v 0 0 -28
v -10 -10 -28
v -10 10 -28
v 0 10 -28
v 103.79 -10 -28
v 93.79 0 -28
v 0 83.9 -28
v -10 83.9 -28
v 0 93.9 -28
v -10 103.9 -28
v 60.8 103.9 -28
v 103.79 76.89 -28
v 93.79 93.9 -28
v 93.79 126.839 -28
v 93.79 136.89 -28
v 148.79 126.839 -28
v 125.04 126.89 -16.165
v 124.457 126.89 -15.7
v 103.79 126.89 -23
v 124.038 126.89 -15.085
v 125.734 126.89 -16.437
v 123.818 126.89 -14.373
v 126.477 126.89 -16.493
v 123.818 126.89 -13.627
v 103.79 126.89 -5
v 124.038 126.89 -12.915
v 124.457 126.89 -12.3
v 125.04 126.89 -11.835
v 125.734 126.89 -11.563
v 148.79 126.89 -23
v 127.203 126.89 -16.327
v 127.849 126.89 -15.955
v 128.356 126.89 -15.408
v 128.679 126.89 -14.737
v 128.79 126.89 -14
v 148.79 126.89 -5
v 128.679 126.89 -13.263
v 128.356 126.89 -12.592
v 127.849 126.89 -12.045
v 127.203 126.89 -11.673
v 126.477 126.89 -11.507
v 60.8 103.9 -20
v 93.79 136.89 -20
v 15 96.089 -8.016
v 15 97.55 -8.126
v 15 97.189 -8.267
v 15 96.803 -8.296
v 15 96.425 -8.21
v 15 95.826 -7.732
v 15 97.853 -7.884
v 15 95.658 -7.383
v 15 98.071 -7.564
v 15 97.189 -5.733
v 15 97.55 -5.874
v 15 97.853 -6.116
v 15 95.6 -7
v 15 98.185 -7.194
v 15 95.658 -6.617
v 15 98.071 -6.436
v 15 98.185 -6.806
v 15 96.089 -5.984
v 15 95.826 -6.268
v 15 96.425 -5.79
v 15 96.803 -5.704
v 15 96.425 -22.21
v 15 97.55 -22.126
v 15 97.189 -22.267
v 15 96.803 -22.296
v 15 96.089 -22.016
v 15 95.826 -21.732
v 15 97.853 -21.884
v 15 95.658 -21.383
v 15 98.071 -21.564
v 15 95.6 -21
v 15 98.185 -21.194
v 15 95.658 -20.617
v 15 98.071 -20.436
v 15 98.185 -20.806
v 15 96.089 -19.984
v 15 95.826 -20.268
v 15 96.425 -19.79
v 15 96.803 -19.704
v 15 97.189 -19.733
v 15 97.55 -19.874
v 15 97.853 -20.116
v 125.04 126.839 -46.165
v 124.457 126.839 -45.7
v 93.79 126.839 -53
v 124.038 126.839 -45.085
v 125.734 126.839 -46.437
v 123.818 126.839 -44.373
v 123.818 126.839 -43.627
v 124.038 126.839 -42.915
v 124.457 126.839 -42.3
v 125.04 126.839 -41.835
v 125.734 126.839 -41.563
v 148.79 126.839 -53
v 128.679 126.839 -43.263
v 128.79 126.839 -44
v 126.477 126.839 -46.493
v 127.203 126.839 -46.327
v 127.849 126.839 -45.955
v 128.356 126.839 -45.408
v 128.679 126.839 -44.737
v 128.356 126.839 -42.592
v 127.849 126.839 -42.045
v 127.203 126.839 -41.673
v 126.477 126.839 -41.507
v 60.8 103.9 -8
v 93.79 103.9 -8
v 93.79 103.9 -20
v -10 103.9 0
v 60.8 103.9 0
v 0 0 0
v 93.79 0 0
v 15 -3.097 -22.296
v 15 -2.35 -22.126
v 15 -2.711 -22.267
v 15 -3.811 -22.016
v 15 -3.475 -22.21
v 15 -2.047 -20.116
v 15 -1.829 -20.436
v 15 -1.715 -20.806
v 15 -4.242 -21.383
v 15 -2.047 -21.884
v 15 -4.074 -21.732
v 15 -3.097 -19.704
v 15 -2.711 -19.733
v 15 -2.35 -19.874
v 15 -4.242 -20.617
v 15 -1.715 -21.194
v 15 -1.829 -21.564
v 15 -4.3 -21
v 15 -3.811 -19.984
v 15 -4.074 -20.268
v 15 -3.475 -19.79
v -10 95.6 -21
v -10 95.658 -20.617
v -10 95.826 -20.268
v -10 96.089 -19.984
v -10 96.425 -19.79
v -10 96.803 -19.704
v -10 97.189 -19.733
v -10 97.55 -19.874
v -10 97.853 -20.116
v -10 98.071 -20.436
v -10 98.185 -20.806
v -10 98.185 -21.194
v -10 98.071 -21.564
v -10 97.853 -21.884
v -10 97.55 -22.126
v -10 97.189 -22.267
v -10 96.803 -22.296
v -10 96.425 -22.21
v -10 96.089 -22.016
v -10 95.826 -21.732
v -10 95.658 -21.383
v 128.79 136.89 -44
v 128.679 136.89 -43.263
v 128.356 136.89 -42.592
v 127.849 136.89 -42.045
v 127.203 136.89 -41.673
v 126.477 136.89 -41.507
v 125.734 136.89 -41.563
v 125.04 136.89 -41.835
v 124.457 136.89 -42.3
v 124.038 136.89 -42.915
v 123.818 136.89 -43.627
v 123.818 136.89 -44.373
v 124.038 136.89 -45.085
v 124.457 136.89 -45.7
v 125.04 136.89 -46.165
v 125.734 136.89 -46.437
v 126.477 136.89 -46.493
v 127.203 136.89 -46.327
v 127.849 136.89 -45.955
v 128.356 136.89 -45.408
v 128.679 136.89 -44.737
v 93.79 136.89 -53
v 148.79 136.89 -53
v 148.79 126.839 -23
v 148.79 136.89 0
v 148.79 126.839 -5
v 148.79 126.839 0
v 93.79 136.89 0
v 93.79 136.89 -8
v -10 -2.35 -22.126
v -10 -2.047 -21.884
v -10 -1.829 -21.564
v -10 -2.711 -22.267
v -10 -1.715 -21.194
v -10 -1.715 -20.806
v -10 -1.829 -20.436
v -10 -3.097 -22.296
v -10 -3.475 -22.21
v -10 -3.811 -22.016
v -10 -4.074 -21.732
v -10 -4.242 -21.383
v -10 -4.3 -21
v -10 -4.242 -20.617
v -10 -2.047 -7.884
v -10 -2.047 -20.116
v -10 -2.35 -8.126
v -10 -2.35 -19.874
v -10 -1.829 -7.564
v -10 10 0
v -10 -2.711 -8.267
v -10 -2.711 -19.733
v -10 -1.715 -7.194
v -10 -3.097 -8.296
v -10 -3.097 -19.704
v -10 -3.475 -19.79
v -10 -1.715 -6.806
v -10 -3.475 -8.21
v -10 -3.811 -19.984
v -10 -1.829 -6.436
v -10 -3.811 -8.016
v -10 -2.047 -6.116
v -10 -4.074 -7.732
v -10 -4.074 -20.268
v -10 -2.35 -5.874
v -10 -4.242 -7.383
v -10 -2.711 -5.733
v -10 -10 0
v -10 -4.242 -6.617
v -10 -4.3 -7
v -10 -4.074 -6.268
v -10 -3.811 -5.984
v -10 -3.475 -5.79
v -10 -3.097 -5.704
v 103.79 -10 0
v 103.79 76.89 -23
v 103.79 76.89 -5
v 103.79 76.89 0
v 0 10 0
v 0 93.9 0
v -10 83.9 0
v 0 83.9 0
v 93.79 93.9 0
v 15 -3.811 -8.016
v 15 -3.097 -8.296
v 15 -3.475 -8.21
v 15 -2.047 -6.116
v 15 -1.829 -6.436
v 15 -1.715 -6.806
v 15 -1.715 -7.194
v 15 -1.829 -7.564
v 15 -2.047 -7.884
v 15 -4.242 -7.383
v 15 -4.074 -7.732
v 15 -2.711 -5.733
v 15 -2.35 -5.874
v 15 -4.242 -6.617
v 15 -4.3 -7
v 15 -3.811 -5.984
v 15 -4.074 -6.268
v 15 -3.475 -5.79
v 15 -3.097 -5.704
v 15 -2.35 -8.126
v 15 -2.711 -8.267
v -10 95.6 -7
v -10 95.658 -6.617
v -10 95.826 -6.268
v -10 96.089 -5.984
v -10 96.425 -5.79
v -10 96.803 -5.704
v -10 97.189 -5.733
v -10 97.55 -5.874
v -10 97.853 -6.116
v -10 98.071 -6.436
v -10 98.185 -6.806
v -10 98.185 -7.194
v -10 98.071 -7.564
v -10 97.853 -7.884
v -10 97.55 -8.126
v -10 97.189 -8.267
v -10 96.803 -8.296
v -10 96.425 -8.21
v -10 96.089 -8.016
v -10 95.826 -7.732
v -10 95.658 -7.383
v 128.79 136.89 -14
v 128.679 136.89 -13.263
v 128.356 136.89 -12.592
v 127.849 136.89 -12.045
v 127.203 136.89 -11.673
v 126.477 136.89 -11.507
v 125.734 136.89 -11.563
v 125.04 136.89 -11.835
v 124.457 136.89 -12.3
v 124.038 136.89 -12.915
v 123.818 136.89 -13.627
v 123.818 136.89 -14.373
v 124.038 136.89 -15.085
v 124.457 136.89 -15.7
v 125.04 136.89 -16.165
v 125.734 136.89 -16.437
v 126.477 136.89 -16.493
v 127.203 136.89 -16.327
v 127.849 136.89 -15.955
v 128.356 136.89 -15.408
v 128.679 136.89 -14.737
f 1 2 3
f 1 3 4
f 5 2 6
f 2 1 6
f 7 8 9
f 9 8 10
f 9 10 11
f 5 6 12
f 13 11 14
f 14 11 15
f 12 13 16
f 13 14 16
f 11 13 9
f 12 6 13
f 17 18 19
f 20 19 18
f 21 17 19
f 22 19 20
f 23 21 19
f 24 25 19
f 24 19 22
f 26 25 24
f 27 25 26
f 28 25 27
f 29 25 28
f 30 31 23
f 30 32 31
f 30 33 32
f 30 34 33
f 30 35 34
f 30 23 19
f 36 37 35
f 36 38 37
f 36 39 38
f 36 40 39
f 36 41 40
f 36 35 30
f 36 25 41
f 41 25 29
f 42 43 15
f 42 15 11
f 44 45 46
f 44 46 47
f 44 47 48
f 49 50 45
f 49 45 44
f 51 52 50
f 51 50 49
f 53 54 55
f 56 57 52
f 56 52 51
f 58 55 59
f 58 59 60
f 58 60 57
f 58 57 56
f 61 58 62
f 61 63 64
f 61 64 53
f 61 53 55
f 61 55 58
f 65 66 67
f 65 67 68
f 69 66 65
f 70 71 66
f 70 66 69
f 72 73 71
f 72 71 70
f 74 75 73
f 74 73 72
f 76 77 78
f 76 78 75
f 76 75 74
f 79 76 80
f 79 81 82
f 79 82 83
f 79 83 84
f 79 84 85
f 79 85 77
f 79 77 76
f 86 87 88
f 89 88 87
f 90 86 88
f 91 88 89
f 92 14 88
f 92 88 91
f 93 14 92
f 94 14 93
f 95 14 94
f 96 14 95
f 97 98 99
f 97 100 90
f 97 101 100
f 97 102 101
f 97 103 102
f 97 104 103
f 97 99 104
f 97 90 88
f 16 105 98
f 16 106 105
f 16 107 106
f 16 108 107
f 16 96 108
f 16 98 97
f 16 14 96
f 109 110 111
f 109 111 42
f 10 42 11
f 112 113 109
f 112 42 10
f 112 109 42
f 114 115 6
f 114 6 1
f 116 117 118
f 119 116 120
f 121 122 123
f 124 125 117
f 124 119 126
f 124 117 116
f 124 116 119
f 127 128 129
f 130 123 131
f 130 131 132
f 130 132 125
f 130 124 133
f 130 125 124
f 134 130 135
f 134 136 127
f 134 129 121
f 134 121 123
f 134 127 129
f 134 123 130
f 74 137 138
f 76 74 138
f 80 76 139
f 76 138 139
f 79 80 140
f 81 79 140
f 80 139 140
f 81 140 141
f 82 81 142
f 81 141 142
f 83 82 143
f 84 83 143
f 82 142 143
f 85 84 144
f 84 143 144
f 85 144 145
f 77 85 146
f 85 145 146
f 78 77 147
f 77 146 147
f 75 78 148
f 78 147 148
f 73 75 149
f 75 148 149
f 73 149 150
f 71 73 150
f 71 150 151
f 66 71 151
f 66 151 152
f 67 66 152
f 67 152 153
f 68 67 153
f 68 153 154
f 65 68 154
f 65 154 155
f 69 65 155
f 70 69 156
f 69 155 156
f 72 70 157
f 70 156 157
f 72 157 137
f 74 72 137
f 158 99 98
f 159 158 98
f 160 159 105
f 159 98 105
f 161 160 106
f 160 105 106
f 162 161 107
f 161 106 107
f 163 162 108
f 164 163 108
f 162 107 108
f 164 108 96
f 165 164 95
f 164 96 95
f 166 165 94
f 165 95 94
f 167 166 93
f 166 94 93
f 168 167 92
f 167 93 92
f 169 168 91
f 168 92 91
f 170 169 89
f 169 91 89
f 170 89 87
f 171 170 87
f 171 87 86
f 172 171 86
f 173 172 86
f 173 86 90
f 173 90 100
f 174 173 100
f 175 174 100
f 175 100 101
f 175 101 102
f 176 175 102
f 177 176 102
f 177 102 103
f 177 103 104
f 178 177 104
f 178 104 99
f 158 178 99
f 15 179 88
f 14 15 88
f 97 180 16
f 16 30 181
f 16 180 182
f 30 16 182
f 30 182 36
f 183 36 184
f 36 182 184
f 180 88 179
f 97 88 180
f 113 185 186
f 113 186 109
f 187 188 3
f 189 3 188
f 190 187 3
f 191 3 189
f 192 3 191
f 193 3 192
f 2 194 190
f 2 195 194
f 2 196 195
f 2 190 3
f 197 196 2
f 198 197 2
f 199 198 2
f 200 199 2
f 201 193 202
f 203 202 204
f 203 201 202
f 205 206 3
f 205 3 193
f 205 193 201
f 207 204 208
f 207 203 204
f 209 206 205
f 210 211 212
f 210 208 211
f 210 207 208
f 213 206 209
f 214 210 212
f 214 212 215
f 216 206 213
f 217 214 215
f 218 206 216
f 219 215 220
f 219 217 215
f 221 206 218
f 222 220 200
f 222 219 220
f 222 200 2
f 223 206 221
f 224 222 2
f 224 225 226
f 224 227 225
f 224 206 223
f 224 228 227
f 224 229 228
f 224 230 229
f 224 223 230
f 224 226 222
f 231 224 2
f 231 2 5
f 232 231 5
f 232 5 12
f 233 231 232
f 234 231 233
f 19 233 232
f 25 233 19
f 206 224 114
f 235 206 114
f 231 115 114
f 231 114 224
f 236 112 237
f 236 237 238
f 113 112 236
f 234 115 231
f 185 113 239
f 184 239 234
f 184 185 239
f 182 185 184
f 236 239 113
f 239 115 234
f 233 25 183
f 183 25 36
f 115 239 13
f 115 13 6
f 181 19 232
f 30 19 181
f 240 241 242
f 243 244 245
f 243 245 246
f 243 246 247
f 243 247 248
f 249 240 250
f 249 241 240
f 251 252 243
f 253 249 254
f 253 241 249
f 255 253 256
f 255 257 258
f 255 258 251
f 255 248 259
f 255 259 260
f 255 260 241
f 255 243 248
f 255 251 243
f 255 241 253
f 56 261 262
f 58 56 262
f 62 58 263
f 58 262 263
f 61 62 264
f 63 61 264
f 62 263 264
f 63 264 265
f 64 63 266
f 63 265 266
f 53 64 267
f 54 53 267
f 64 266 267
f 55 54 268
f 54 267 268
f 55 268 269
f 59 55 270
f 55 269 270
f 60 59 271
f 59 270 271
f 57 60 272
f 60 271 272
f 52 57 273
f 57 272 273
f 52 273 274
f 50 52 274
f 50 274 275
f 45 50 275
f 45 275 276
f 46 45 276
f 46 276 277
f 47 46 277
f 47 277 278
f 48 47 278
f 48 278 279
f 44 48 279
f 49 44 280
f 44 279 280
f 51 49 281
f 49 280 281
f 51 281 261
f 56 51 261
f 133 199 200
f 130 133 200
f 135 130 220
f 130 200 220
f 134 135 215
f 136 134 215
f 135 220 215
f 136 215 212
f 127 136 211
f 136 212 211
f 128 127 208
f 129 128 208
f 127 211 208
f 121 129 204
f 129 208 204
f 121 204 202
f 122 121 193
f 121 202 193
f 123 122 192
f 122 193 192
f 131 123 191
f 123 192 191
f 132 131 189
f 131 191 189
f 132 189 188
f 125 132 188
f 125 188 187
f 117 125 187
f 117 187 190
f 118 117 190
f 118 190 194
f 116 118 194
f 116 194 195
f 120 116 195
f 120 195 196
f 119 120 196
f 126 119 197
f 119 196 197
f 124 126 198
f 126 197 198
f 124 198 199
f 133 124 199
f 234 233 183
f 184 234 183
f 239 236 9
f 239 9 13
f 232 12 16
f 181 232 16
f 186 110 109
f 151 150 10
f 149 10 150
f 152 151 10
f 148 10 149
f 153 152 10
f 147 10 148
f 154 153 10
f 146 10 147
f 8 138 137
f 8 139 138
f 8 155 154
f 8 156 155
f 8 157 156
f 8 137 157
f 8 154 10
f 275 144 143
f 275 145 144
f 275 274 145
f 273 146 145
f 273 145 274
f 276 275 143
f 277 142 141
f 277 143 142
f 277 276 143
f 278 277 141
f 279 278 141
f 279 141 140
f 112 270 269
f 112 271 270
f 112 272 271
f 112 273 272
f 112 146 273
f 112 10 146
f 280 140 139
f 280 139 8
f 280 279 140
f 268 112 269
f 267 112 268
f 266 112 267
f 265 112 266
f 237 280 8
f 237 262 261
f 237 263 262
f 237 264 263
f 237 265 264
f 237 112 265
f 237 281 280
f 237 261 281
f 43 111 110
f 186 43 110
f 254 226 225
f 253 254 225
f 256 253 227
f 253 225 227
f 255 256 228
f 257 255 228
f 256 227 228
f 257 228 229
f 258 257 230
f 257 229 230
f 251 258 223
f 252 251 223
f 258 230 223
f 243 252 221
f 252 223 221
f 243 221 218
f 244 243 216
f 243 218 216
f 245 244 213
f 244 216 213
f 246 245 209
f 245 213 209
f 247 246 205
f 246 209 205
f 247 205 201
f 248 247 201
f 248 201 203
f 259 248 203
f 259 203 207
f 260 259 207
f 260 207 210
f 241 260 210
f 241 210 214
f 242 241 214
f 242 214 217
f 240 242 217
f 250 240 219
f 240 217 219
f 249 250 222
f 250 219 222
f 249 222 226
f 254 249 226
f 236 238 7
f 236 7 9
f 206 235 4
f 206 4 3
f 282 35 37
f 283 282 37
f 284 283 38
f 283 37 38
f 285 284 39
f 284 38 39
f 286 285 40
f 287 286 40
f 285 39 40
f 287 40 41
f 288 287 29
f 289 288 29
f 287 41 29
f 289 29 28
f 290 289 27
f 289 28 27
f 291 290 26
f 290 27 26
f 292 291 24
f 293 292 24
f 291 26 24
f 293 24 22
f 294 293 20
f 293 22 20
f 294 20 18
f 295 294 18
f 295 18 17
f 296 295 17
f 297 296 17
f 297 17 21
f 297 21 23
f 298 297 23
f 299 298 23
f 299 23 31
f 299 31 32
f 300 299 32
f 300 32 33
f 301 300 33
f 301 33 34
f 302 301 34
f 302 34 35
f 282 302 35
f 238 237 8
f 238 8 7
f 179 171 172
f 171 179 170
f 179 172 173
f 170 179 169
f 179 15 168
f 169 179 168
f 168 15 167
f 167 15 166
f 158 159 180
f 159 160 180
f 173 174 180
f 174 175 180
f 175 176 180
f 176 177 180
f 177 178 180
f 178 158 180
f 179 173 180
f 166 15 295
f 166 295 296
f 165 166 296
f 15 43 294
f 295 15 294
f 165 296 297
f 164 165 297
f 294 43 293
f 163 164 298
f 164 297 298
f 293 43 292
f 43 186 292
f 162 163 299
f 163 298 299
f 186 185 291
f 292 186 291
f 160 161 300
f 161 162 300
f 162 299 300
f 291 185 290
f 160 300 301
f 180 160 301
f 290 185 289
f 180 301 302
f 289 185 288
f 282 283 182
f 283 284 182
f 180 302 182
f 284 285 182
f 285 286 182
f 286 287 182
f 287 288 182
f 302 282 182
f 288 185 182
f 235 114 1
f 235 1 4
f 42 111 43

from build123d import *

# Parameters (mm, degrees)
F1_DEPTH  = 28
F2_W      = 45
F2_H      = 5
F3_DEPTH  = 50
F5_DEPTH  = 28.001
F7_DEPTH  = 28
F8_W      = 37.4603138711
F8_H      = 12
F9_DEPTH  = 32.99
F10_W     = 55
F10_H     = 10.051137104
F11_DEPTH = 25
F12_R     = 2.5
F13_DEPTH = 10.052137104
F14_R     = 1.3
F15_DEPTH = 25


with BuildPart() as f1:
    # F0 (on Top) → F1 (new body)
    with BuildSketch(Plane.XY):
        Polygon((93.79, 0), (0, 0), (0, 10), (-10, 10), (-10, -10), (103.79, -10), (103.79, 126.89), (148.79, 126.89), (148.79, 136.89), (93.79, 136.89), (93.79, 103.9), (-10, 103.9), (-10, 83.9), (0, 83.9), (0, 93.9), (93.79, 93.9), align=None)
    extrude(amount=-F1_DEPTH)

    # F2 (on face) → F3 (join)
    with BuildSketch(Plane.XZ.offset(-126.89)):
        with Locations((126.29, -2.5)):
            Rectangle(F2_W, F2_H)
        with Locations((126.29, -25.5)):
            Rectangle(F2_W, F2_H)
    extrude(amount=F3_DEPTH)

    # F4 (on face) → F5 (cut, through all)
    with BuildSketch(Plane(origin=(0, 0, -28), x_dir=(1, 0, 0), z_dir=(0, 0, -1))):
        Polygon((105.9448644519, -76.89), (103.79, -76.89), (148.79, -126.838862896), (148.79, -76.89), align=None)
    extrude(amount=-F5_DEPTH, mode=Mode.SUBTRACT)

    # F6 (on face) → F7 (join)
    with BuildSketch(Plane.XY):
        Polygon((93.79, 103.9), (93.79, 136.89), (60.8, 103.9), align=None)
    extrude(amount=-F7_DEPTH)

    # F8 (on face) → F9 (cut)
    with BuildSketch(Plane(origin=(0, 136.89, 0), x_dir=(-1, 0, 0), z_dir=(0, 1, 0))):
        with Locations((-75.0598430644, -14)):
            Rectangle(F8_W, F8_H)
    extrude(amount=-F9_DEPTH, mode=Mode.SUBTRACT)

    # F10 (on face) → F11 (join)
    with BuildSketch(Plane(origin=(0, 0, -28), x_dir=(1, 0, 0), z_dir=(0, 0, -1))):
        with Locations((121.29, -131.864431448)):
            Rectangle(F10_W, F10_H)
    extrude(amount=F11_DEPTH)

    # F12 (on face) → F13 (cut, through all)
    with BuildSketch(Plane.XZ.offset(-126.838862896)):
        with Locations((126.29, -14)):
            Circle(F12_R)
        with Locations((126.29, -44)):
            Circle(F12_R)
    extrude(amount=-F13_DEPTH, mode=Mode.SUBTRACT)

    # F14 (on face) → F15 (cut)
    with BuildSketch(Plane(origin=(-10, 0, 0), x_dir=(0, -1, 0), z_dir=(-1, 0, 0))):
        with Locations((-96.9, -7)):
            Circle(F14_R)
        with Locations((-96.9, -21)):
            Circle(F14_R)
        with Locations((3, -7)):
            Circle(F14_R)
        with Locations((3, -21)):
            Circle(F14_R)
    extrude(amount=-F15_DEPTH, mode=Mode.SUBTRACT)


solid = f1.part
